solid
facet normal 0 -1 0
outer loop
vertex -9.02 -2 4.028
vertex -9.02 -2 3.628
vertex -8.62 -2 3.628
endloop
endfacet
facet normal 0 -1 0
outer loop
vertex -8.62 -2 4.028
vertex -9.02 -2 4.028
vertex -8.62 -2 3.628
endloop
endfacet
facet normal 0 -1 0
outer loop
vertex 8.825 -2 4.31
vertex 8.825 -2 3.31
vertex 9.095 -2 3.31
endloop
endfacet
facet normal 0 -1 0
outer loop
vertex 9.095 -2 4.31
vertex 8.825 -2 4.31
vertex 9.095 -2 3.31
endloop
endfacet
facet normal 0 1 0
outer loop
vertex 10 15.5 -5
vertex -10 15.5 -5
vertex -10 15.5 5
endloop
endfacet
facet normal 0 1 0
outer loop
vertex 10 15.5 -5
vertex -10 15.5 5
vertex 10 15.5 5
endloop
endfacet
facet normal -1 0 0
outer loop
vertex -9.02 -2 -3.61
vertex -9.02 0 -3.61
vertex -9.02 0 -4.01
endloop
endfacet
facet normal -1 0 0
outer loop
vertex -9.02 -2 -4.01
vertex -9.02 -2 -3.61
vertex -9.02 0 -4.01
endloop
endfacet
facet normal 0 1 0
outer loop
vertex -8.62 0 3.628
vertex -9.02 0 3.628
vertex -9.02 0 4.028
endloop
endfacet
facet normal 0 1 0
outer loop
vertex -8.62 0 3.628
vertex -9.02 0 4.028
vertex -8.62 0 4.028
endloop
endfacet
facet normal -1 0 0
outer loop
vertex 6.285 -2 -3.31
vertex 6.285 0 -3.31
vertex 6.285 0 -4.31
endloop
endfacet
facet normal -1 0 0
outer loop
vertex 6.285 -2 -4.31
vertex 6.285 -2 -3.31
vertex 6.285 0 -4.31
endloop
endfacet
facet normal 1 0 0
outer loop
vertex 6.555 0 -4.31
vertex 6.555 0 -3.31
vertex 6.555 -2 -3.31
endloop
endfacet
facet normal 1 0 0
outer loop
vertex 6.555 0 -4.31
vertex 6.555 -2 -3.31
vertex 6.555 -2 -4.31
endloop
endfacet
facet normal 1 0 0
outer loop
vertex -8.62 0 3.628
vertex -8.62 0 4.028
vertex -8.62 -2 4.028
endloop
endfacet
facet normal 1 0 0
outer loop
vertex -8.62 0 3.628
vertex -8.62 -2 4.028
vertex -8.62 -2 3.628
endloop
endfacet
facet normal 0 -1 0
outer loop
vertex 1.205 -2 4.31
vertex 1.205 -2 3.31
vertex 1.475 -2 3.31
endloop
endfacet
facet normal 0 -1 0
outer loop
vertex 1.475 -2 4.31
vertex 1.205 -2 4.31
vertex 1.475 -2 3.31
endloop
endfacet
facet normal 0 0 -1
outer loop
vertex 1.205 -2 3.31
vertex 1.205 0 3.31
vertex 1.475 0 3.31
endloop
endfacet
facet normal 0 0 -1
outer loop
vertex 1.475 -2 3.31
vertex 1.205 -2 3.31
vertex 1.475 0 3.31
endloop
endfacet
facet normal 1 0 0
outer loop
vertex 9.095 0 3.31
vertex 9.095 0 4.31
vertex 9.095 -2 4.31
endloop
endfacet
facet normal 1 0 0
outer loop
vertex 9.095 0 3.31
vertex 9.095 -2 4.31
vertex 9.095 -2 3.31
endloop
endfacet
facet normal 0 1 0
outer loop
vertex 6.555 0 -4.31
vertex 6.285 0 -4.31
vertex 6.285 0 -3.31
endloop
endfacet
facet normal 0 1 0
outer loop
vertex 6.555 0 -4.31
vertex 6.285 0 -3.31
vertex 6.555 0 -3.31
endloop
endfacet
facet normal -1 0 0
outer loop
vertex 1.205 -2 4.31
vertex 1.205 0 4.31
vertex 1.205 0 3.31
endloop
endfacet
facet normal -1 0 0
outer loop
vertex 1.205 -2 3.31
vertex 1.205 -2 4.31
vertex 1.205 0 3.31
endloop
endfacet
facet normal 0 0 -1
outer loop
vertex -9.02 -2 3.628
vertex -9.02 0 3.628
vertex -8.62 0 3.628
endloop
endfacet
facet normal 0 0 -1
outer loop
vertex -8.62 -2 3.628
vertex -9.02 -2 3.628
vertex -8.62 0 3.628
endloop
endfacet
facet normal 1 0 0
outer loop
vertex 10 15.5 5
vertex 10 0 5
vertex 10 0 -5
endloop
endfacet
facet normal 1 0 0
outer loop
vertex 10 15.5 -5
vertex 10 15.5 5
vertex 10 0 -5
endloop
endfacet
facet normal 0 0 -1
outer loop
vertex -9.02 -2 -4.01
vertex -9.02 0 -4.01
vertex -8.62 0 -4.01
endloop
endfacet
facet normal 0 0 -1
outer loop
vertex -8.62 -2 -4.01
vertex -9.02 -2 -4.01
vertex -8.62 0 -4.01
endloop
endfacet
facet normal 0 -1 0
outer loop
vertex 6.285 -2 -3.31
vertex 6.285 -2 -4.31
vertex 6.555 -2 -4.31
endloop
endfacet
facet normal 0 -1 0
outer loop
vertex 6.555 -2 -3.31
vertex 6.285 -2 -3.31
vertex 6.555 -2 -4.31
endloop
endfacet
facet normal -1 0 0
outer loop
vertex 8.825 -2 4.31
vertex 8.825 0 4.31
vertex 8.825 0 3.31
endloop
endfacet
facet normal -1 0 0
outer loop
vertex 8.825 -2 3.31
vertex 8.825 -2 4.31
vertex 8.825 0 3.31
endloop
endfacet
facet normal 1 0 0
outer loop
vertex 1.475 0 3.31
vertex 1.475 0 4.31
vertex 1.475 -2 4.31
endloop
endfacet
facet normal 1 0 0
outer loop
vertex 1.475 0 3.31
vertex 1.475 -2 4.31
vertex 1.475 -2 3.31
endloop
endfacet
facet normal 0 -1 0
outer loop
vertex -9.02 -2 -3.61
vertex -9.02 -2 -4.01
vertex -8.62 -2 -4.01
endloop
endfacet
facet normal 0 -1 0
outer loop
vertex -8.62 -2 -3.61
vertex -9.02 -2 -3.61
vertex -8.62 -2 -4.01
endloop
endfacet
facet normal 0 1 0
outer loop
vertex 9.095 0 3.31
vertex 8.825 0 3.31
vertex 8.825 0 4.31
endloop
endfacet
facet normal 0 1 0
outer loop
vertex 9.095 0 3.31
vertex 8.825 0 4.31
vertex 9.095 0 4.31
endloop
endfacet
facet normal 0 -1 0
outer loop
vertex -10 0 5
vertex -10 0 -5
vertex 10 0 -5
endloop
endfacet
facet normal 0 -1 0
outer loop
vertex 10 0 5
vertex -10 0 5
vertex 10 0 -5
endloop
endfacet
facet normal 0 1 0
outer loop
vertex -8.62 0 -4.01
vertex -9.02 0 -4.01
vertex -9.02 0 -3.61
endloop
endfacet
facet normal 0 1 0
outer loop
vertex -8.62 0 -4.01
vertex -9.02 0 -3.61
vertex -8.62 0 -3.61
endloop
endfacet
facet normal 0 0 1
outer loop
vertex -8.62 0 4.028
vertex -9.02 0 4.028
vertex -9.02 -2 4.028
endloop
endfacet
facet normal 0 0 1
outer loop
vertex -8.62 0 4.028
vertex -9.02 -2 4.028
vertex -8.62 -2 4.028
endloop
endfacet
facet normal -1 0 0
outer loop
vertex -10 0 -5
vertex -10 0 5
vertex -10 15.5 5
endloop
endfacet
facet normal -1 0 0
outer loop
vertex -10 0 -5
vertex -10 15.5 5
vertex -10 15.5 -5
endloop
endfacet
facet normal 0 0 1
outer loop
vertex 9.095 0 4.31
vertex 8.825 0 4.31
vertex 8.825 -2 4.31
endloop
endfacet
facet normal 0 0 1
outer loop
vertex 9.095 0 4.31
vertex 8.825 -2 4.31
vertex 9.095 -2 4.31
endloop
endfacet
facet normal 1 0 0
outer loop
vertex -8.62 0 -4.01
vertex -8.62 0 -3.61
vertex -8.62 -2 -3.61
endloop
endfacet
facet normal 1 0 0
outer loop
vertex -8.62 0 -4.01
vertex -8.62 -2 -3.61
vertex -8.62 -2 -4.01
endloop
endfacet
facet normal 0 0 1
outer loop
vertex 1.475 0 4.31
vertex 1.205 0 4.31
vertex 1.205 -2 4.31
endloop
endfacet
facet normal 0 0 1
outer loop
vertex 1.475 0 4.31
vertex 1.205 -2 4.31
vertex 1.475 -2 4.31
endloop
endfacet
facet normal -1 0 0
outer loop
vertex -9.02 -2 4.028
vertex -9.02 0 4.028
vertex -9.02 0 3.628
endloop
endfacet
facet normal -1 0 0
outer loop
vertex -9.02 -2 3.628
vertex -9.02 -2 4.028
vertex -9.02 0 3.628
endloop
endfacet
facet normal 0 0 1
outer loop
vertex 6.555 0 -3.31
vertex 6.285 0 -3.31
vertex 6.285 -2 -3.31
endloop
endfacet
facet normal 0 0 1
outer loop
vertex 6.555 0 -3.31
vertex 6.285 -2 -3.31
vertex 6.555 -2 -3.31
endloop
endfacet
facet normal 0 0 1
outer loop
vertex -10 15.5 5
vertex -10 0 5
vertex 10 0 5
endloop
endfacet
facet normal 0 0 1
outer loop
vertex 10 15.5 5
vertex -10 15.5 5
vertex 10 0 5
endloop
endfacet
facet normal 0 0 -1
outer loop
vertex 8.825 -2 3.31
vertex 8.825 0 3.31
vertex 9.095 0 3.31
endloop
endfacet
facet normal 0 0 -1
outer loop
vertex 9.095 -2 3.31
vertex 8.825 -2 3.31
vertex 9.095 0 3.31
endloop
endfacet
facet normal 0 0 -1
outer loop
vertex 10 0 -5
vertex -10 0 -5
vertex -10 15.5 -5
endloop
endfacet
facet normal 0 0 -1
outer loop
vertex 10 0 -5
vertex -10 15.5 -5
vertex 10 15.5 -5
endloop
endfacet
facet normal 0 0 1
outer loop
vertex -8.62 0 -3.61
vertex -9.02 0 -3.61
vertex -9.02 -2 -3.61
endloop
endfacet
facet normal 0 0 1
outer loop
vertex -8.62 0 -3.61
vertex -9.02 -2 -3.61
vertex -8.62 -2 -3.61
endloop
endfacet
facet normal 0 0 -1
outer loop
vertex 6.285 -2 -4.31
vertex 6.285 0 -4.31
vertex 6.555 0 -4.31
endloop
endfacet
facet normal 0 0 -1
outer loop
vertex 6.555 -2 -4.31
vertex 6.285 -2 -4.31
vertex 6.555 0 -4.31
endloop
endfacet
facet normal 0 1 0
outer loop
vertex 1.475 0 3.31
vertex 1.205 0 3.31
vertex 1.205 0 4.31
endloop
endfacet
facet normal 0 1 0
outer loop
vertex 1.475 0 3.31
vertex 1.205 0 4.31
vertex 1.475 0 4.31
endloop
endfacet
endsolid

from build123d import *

# Parameters (mm, degrees)
SKETCH_1_W        = 20
SKETCH_1_H        = 10
EXTRUDE_1_DEPTH   = 15.5
SKETCH_2_W        = 0.4
SKETCH_2_H        = 0.4
EXTRUDE_2_DEPTH   = 2
EXTRUDE_2_2_DEPTH = 2
SKETCH_2_W_2      = 0.27
SKETCH_2_H_2      = 1
EXTRUDE_2_3_DEPTH = 2
EXTRUDE_2_4_DEPTH = 2
EXTRUDE_2_5_DEPTH = 2


with BuildPart() as part:
    # Эскиз1 → Бобышка-Вытянуть1 (new body)
    with BuildSketch(Plane(origin=(0, 0, 0), x_dir=(1, 0, 0), z_dir=(0, 1, 0))):
        Rectangle(SKETCH_1_W, SKETCH_1_H)
    extrude(amount=EXTRUDE_1_DEPTH)


with BuildPart() as body_2:
    # Эскиз2 → Бобышка-Вытянуть2 (new body)
    with BuildSketch(Plane(origin=(0, 0, 0), x_dir=(1, 0, 0), z_dir=(0, 1, 0))):
        with Locations((-8.82, 3.81)):
            Rectangle(SKETCH_2_W, SKETCH_2_H)
    extrude(amount=-EXTRUDE_2_DEPTH)


with BuildPart() as body_3:
    # Эскиз2 → Extrude 2 2 (new body)
    with BuildSketch(Plane(origin=(0, 0, 0), x_dir=(1, 0, 0), z_dir=(0, 1, 0))):
        with Locations((-8.82, -3.828134121)):
            Rectangle(SKETCH_2_W, SKETCH_2_H)
    extrude(amount=-EXTRUDE_2_2_DEPTH)


with BuildPart() as body_4:
    # Эскиз2 → Extrude 2 3 (new body)
    with BuildSketch(Plane(origin=(0, 0, 0), x_dir=(1, 0, 0), z_dir=(0, 1, 0))):
        with Locations((1.34, -3.81)):
            Rectangle(SKETCH_2_W_2, SKETCH_2_H_2)
    extrude(amount=-EXTRUDE_2_3_DEPTH)


with BuildPart() as body_5:
    # Эскиз2 → Extrude 2 4 (new body)
    with BuildSketch(Plane(origin=(0, 0, 0), x_dir=(1, 0, 0), z_dir=(0, 1, 0))):
        with Locations((8.96, -3.81)):
            Rectangle(SKETCH_2_W_2, SKETCH_2_H_2)
    extrude(amount=-EXTRUDE_2_4_DEPTH)


with BuildPart() as body_6:
    # Эскиз2 → Extrude 2 5 (new body)
    with BuildSketch(Plane(origin=(0, 0, 0), x_dir=(1, 0, 0), z_dir=(0, 1, 0))):
        with Locations((6.42, 3.81)):
            Rectangle(SKETCH_2_W_2, SKETCH_2_H_2)
    extrude(amount=-EXTRUDE_2_5_DEPTH)


solid = Compound([part.part, body_2.part, body_3.part, body_4.part, body_5.part, body_6.part])
